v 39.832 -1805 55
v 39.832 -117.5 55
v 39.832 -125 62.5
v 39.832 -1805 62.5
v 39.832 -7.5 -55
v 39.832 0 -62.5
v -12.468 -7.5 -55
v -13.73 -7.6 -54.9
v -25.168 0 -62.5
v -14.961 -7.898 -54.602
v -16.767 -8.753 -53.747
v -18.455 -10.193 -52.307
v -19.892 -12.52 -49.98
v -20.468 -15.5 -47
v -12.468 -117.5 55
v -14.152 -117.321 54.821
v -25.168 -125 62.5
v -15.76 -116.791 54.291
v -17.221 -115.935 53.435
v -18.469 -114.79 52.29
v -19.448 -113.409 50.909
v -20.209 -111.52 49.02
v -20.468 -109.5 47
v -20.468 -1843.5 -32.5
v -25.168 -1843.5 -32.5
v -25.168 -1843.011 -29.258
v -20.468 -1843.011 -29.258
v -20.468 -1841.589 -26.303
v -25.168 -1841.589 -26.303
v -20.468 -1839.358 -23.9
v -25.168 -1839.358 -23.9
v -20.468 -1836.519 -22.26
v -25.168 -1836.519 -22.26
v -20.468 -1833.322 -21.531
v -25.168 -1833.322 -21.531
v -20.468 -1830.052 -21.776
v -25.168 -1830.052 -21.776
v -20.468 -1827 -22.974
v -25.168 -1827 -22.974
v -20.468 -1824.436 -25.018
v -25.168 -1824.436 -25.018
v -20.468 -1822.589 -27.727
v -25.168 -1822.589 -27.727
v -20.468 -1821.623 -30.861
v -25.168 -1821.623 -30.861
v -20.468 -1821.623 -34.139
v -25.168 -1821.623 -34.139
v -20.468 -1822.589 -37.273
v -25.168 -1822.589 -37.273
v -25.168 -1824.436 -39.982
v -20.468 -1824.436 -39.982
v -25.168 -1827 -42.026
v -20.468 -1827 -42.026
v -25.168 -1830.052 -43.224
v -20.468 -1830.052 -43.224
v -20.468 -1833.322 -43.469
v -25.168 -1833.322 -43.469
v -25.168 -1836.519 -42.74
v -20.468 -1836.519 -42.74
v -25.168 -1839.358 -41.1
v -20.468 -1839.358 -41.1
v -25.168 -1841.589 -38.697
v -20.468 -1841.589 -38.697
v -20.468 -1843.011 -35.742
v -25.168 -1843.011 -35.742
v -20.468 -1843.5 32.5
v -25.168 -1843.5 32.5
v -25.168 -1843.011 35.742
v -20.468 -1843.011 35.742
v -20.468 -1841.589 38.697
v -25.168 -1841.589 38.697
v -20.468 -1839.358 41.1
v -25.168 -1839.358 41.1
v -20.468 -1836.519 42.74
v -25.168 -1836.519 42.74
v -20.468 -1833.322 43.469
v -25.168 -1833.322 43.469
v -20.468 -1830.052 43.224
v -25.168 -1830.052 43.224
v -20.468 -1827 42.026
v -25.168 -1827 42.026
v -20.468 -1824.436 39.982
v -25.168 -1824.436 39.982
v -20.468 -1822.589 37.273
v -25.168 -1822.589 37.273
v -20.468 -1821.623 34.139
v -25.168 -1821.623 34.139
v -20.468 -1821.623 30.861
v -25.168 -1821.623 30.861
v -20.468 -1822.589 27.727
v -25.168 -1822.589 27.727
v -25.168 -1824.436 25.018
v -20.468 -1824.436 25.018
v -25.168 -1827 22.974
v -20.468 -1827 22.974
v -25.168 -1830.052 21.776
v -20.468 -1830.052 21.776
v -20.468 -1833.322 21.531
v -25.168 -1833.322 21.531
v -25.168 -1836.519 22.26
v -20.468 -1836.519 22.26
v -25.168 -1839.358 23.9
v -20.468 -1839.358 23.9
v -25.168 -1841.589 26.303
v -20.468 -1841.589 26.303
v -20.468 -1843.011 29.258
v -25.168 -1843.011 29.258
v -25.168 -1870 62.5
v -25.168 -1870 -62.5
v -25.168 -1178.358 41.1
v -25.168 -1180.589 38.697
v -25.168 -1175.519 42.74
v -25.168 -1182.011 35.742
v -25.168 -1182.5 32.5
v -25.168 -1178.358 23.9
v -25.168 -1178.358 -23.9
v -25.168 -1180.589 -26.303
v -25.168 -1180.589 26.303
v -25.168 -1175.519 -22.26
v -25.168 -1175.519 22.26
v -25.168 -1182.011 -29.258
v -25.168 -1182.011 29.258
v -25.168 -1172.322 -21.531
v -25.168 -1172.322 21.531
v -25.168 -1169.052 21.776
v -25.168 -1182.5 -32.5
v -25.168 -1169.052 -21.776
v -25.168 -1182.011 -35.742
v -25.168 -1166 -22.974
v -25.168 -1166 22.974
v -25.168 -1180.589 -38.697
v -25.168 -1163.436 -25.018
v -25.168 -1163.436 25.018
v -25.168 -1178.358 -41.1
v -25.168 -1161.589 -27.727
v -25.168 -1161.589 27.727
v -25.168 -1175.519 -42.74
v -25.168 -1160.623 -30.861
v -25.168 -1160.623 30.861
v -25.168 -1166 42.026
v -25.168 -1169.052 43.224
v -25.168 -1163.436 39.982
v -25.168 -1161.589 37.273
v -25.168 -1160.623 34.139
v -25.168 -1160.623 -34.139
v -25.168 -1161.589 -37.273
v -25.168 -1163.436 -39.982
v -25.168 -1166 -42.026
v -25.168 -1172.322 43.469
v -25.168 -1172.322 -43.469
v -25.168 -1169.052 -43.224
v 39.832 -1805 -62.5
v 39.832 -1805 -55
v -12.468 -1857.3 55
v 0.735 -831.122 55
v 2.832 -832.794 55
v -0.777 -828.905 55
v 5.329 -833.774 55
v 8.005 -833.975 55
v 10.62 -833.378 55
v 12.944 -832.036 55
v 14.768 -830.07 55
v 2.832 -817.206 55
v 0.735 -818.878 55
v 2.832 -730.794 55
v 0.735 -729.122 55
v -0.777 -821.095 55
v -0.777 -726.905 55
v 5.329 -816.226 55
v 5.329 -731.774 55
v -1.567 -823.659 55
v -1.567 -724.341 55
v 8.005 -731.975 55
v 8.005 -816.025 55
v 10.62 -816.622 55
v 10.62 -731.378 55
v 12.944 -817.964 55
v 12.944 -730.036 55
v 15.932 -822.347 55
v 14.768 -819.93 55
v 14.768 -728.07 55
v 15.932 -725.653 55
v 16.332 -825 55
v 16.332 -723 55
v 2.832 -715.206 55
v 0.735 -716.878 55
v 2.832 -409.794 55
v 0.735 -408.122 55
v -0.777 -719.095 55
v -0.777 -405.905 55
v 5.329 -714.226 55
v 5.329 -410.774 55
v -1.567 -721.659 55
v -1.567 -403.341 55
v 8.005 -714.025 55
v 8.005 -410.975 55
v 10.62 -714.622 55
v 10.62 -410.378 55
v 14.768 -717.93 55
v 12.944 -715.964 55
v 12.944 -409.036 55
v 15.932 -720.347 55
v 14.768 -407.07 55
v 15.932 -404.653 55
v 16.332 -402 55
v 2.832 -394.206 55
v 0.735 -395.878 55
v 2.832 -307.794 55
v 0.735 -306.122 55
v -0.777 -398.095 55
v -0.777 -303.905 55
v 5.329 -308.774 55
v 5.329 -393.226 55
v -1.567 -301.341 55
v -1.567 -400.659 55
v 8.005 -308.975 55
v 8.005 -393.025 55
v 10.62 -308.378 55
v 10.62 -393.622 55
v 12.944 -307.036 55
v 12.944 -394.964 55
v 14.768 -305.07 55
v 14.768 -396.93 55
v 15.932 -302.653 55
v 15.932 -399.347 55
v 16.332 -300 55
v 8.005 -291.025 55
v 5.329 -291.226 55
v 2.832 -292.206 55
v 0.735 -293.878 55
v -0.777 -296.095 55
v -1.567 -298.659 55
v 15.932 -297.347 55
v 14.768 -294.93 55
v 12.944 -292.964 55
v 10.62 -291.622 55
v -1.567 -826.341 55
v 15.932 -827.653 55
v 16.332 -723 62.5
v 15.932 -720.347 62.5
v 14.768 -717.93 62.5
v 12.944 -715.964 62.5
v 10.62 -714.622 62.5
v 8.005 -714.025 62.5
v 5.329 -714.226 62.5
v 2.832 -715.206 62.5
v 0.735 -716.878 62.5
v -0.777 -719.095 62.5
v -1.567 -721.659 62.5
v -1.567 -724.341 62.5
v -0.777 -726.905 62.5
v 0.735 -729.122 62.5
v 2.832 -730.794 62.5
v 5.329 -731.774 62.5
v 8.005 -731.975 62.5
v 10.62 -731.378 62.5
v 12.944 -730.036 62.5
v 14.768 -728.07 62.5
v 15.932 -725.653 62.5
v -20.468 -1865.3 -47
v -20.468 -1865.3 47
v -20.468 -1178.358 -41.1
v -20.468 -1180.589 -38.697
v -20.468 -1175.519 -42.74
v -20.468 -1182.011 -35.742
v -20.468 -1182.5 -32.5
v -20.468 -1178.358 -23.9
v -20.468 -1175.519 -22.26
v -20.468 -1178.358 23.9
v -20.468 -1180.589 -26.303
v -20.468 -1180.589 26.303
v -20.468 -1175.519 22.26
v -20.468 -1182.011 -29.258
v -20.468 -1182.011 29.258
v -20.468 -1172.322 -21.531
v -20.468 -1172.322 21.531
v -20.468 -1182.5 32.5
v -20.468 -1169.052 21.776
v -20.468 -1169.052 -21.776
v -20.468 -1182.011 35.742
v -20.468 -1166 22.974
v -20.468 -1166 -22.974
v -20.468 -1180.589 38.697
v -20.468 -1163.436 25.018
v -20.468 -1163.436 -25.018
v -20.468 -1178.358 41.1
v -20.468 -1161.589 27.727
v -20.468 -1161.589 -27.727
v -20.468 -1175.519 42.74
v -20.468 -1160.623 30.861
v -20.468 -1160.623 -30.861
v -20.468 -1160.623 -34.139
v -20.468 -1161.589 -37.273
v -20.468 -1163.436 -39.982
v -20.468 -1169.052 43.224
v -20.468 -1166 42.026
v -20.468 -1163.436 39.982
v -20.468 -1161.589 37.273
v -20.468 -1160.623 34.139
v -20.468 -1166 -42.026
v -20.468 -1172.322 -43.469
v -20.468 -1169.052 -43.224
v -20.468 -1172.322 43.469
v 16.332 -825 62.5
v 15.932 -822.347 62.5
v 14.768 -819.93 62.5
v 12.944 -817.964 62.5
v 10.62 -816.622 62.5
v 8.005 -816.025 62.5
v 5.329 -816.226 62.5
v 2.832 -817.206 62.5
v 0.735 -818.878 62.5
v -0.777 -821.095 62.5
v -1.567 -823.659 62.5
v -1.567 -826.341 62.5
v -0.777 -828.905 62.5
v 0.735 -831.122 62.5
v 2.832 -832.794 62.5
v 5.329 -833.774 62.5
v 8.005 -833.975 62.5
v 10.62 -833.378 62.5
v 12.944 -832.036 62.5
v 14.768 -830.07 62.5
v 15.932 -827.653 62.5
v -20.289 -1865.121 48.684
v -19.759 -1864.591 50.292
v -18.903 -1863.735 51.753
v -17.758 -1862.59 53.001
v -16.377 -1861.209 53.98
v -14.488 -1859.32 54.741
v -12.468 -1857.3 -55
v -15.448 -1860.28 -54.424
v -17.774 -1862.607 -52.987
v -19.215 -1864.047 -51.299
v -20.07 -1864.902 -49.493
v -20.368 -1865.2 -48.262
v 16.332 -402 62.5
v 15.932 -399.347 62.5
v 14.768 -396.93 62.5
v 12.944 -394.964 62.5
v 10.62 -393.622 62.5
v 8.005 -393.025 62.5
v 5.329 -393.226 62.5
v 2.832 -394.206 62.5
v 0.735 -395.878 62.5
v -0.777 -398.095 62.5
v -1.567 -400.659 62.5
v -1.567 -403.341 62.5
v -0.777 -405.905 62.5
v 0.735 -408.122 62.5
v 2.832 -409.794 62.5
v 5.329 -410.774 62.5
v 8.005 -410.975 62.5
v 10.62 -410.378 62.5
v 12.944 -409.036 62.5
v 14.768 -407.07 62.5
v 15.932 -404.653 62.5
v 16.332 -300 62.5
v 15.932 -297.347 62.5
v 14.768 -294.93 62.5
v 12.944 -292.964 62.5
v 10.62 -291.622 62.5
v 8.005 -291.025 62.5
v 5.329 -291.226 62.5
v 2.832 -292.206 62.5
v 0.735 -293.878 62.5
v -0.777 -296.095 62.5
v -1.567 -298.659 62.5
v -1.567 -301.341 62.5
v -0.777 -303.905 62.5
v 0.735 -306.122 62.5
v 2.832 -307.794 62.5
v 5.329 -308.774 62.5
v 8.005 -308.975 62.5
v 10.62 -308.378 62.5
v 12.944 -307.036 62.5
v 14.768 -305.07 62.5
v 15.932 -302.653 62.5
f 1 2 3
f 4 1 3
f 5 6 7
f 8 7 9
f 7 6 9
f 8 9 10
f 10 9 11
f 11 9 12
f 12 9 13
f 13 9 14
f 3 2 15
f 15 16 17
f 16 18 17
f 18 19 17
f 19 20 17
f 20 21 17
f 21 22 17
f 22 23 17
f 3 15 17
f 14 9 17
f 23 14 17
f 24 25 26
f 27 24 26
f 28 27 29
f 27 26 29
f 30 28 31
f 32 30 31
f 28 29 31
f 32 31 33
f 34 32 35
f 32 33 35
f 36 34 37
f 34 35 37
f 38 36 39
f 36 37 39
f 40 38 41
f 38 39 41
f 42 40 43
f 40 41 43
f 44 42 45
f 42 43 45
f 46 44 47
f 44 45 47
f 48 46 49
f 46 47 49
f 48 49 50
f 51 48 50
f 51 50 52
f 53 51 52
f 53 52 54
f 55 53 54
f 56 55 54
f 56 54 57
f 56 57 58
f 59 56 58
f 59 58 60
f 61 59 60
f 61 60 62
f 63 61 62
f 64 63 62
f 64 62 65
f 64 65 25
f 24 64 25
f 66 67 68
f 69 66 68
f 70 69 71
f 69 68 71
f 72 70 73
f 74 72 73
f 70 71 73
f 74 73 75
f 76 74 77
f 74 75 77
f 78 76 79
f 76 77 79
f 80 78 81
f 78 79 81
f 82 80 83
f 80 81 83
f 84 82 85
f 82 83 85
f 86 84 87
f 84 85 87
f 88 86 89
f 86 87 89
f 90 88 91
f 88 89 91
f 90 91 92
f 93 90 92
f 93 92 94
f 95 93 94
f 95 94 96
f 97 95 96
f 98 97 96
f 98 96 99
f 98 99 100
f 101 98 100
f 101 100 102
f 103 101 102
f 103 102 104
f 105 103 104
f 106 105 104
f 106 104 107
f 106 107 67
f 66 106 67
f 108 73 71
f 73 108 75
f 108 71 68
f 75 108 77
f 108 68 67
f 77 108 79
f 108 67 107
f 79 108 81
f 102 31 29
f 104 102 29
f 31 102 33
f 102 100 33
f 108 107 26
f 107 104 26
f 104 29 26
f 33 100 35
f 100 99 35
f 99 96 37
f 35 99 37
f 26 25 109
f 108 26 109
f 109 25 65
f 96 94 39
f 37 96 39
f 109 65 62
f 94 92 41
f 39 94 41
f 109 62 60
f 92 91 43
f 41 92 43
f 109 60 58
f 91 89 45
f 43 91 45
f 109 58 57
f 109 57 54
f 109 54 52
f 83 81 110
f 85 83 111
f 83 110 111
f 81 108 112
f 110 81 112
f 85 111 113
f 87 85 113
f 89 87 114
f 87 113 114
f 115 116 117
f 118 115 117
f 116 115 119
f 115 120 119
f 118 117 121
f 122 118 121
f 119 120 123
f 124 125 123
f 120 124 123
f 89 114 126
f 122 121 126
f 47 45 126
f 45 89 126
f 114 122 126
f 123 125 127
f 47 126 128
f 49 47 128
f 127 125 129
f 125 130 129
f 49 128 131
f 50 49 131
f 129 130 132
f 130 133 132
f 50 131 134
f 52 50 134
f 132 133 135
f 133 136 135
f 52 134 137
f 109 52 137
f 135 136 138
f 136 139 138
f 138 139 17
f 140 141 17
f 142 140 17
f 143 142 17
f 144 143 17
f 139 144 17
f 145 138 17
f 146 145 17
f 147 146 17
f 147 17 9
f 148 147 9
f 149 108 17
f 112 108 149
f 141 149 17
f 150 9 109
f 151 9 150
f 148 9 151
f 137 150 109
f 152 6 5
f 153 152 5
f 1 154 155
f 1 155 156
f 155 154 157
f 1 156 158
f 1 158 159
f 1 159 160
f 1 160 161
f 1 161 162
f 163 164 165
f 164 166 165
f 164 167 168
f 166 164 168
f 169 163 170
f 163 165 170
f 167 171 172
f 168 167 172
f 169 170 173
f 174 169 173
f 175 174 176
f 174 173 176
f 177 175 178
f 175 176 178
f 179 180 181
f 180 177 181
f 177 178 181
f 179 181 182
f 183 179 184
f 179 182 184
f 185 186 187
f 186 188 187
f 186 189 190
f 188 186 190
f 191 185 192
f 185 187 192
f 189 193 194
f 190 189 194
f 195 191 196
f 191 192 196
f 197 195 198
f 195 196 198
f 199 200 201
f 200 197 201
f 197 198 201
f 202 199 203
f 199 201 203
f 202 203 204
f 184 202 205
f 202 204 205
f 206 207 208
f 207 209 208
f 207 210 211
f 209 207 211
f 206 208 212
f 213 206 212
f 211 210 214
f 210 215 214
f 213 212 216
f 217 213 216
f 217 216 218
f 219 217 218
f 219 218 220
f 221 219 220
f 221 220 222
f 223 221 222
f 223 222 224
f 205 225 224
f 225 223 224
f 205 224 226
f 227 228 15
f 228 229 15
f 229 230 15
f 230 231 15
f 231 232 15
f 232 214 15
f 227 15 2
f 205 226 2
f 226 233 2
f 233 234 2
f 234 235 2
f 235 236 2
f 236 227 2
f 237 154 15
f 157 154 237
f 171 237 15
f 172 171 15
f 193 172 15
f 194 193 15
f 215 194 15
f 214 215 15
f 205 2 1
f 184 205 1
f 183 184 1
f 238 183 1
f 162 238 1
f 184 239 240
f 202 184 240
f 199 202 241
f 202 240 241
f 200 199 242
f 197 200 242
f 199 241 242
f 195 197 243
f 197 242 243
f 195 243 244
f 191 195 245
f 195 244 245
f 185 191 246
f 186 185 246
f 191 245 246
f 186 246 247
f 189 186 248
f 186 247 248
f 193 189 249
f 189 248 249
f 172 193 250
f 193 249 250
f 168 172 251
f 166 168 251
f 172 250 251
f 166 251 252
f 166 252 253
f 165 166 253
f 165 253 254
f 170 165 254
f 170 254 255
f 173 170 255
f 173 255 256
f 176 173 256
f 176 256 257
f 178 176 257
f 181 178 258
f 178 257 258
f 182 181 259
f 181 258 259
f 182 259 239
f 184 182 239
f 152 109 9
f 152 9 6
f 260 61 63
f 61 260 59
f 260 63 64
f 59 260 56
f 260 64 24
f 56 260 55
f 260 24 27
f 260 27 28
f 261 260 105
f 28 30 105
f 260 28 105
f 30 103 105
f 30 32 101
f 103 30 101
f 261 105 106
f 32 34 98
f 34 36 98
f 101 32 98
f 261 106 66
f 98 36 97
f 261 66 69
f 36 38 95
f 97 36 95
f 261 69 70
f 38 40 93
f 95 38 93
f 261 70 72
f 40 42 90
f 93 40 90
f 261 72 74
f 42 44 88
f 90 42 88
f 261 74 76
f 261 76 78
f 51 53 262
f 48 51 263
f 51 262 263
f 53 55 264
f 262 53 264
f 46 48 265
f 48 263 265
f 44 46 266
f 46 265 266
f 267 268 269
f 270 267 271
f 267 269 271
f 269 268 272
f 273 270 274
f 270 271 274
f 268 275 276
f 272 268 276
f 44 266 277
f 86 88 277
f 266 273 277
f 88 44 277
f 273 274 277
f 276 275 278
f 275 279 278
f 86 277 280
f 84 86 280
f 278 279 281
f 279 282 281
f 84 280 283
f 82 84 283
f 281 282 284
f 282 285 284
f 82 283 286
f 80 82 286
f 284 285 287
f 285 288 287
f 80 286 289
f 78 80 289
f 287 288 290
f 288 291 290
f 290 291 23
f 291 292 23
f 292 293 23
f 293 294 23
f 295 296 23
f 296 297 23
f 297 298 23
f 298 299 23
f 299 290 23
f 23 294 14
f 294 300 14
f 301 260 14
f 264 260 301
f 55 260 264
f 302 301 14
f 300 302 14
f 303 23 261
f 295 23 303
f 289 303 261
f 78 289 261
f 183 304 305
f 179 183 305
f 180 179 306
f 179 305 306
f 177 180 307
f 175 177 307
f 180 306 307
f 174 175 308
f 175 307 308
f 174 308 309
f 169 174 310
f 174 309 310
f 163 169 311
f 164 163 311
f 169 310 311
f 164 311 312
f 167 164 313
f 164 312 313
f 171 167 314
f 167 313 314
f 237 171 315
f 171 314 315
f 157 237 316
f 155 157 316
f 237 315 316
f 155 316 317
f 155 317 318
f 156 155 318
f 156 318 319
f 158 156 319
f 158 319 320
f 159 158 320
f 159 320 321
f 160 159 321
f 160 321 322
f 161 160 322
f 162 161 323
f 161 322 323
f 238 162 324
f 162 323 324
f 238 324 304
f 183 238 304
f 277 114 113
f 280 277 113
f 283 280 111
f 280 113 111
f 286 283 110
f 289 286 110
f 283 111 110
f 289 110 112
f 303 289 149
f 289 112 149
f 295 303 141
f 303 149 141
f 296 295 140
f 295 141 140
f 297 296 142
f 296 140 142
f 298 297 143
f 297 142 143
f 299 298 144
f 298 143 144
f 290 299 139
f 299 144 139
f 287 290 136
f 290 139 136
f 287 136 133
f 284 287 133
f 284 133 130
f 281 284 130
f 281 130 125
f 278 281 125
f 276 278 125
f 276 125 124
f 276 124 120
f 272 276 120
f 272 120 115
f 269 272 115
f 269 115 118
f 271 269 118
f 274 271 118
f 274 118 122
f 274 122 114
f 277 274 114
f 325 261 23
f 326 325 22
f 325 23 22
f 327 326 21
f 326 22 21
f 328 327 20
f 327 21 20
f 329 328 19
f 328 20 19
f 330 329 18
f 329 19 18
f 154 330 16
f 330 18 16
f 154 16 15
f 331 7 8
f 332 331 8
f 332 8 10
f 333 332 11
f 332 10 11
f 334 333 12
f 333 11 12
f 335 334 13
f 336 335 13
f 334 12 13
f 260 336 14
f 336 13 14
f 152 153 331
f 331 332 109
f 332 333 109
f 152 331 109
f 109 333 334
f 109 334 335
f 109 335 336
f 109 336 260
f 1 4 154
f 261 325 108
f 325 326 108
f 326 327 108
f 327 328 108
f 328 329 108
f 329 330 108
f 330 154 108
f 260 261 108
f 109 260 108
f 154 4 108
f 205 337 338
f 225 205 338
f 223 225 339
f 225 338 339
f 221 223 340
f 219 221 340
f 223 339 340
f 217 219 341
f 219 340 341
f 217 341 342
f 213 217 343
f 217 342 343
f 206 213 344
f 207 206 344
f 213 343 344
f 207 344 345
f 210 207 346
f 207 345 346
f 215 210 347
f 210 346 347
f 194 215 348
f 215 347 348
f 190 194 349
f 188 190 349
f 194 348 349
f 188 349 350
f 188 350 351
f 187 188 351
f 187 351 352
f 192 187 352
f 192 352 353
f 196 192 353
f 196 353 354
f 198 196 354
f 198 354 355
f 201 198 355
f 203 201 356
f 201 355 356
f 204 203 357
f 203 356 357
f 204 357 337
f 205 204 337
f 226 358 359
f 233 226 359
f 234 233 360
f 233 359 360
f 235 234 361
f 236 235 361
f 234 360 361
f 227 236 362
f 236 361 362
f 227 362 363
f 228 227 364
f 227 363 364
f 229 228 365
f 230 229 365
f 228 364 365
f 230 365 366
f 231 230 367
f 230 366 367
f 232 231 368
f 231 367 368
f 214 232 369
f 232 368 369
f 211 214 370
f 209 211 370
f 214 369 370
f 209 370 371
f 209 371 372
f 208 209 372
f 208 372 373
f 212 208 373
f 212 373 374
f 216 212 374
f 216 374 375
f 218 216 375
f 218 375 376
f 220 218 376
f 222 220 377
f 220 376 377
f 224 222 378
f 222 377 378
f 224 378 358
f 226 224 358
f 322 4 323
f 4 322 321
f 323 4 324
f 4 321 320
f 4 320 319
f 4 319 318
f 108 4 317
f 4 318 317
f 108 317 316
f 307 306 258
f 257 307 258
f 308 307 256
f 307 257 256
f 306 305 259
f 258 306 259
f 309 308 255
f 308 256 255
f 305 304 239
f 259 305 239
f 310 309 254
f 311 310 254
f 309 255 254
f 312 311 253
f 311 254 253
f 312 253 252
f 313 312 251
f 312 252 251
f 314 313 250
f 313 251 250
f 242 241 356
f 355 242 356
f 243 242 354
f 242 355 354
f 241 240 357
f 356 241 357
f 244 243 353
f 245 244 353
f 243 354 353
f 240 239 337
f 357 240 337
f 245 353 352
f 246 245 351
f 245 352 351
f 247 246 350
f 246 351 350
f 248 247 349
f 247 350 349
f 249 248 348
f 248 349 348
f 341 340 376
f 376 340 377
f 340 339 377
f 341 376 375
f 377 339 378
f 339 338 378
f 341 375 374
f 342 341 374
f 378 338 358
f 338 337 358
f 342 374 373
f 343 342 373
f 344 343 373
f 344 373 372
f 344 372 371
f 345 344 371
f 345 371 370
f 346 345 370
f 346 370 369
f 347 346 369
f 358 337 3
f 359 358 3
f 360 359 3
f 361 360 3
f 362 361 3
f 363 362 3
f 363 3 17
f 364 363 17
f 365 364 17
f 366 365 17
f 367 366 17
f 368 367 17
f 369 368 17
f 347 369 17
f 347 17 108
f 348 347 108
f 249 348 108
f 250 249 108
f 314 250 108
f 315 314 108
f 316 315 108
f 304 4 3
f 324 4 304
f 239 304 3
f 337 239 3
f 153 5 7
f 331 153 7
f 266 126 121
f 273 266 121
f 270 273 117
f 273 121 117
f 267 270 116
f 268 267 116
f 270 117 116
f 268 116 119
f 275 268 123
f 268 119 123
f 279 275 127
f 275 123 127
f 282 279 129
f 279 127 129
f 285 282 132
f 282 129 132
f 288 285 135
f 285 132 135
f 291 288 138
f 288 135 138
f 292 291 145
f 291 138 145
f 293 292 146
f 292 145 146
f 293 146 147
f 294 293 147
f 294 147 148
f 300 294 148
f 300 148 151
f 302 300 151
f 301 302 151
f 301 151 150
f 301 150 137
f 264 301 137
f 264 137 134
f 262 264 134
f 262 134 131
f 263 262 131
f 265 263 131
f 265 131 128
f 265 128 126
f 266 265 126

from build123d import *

# Parameters (mm, degrees)
F1_DEPTH  = 1870
F3_DEPTH  = 65.001
F5_DEPTH  = 125.001
F6_R      = 9
F7_DEPTH  = 7.5
F8_R      = 9
F9_DEPTH  = 7.5
F10_R     = 11
F11_DEPTH = 25


with BuildPart() as f1:
    # F0 (on Front) → F1 (new body)
    with BuildSketch(Plane.XZ):
        with BuildLine():
            Line((-25.16784, 62.5), (-25.16784, -62.5))
            Line((-25.16784, -62.5), (39.83216, -62.5))
            Line((39.83216, -62.5), (39.83216, -55))
            Line((39.83216, -55), (-12.46784, -55))
            ThreePointArc((-12.46784, -55), (-18.124695, -52.656854), (-20.46784, -47))
            Line((-20.46784, -47), (-20.46784, 47))
            ThreePointArc((-20.46784, 47), (-18.124695, 52.656854), (-12.46784, 55))
            Line((-12.46784, 55), (39.83216, 55))
            Line((39.83216, 55), (39.83216, 62.5))
            Line((39.83216, 62.5), (-25.16784, 62.5))
        make_face()
    extrude(amount=F1_DEPTH)

    # F2 (on face) → F3 (cut, through all)
    with BuildSketch(Plane(origin=(-25.16784, 0, 0), x_dir=(0, -1, 0), z_dir=(-1, 0, 0))):
        Polygon((125, 62.5), (0, 62.5), (0, -62.5), align=None)
    extrude(amount=-F3_DEPTH, mode=Mode.SUBTRACT)

    # F4 (on face) → F5 (cut, through all)
    with BuildSketch(Plane.XY.offset(62.5)):
        Polygon((-25.16784, -1870), (39.83216, -1870), (39.83216, -1805), align=None)
    extrude(amount=-F5_DEPTH, mode=Mode.SUBTRACT)

    # F6 (on face) → F7 (cut, through all)
    with BuildSketch(Plane.XY.offset(62.5)):
        with Locations((7.33216, -723)):
            Circle(F6_R)
        with Locations((7.33216, -825)):
            Circle(F6_R)
    extrude(amount=-F7_DEPTH, mode=Mode.SUBTRACT)

    # F8 (on face) → F9 (cut, through all)
    with BuildSketch(Plane.XY.offset(62.5)):
        with Locations((7.33216, -300)):
            Circle(F8_R)
        with Locations((7.33216, -402)):
            Circle(F8_R)
    extrude(amount=-F9_DEPTH, mode=Mode.SUBTRACT)

    # F10 (on face) → F11 (cut)
    with BuildSketch(Plane(origin=(-25.16784, 0, 0), x_dir=(0, -1, 0), z_dir=(-1, 0, 0))):
        with Locations((1832.5, 32.5)):
            Circle(F10_R)
        with Locations((1832.5, -32.5)):
            Circle(F10_R)
        with Locations((1171.5, 32.5)):
            Circle(F10_R)
        with Locations((1171.5, -32.5)):
            Circle(F10_R)
    extrude(amount=-F11_DEPTH, mode=Mode.SUBTRACT)


solid = f1.part
